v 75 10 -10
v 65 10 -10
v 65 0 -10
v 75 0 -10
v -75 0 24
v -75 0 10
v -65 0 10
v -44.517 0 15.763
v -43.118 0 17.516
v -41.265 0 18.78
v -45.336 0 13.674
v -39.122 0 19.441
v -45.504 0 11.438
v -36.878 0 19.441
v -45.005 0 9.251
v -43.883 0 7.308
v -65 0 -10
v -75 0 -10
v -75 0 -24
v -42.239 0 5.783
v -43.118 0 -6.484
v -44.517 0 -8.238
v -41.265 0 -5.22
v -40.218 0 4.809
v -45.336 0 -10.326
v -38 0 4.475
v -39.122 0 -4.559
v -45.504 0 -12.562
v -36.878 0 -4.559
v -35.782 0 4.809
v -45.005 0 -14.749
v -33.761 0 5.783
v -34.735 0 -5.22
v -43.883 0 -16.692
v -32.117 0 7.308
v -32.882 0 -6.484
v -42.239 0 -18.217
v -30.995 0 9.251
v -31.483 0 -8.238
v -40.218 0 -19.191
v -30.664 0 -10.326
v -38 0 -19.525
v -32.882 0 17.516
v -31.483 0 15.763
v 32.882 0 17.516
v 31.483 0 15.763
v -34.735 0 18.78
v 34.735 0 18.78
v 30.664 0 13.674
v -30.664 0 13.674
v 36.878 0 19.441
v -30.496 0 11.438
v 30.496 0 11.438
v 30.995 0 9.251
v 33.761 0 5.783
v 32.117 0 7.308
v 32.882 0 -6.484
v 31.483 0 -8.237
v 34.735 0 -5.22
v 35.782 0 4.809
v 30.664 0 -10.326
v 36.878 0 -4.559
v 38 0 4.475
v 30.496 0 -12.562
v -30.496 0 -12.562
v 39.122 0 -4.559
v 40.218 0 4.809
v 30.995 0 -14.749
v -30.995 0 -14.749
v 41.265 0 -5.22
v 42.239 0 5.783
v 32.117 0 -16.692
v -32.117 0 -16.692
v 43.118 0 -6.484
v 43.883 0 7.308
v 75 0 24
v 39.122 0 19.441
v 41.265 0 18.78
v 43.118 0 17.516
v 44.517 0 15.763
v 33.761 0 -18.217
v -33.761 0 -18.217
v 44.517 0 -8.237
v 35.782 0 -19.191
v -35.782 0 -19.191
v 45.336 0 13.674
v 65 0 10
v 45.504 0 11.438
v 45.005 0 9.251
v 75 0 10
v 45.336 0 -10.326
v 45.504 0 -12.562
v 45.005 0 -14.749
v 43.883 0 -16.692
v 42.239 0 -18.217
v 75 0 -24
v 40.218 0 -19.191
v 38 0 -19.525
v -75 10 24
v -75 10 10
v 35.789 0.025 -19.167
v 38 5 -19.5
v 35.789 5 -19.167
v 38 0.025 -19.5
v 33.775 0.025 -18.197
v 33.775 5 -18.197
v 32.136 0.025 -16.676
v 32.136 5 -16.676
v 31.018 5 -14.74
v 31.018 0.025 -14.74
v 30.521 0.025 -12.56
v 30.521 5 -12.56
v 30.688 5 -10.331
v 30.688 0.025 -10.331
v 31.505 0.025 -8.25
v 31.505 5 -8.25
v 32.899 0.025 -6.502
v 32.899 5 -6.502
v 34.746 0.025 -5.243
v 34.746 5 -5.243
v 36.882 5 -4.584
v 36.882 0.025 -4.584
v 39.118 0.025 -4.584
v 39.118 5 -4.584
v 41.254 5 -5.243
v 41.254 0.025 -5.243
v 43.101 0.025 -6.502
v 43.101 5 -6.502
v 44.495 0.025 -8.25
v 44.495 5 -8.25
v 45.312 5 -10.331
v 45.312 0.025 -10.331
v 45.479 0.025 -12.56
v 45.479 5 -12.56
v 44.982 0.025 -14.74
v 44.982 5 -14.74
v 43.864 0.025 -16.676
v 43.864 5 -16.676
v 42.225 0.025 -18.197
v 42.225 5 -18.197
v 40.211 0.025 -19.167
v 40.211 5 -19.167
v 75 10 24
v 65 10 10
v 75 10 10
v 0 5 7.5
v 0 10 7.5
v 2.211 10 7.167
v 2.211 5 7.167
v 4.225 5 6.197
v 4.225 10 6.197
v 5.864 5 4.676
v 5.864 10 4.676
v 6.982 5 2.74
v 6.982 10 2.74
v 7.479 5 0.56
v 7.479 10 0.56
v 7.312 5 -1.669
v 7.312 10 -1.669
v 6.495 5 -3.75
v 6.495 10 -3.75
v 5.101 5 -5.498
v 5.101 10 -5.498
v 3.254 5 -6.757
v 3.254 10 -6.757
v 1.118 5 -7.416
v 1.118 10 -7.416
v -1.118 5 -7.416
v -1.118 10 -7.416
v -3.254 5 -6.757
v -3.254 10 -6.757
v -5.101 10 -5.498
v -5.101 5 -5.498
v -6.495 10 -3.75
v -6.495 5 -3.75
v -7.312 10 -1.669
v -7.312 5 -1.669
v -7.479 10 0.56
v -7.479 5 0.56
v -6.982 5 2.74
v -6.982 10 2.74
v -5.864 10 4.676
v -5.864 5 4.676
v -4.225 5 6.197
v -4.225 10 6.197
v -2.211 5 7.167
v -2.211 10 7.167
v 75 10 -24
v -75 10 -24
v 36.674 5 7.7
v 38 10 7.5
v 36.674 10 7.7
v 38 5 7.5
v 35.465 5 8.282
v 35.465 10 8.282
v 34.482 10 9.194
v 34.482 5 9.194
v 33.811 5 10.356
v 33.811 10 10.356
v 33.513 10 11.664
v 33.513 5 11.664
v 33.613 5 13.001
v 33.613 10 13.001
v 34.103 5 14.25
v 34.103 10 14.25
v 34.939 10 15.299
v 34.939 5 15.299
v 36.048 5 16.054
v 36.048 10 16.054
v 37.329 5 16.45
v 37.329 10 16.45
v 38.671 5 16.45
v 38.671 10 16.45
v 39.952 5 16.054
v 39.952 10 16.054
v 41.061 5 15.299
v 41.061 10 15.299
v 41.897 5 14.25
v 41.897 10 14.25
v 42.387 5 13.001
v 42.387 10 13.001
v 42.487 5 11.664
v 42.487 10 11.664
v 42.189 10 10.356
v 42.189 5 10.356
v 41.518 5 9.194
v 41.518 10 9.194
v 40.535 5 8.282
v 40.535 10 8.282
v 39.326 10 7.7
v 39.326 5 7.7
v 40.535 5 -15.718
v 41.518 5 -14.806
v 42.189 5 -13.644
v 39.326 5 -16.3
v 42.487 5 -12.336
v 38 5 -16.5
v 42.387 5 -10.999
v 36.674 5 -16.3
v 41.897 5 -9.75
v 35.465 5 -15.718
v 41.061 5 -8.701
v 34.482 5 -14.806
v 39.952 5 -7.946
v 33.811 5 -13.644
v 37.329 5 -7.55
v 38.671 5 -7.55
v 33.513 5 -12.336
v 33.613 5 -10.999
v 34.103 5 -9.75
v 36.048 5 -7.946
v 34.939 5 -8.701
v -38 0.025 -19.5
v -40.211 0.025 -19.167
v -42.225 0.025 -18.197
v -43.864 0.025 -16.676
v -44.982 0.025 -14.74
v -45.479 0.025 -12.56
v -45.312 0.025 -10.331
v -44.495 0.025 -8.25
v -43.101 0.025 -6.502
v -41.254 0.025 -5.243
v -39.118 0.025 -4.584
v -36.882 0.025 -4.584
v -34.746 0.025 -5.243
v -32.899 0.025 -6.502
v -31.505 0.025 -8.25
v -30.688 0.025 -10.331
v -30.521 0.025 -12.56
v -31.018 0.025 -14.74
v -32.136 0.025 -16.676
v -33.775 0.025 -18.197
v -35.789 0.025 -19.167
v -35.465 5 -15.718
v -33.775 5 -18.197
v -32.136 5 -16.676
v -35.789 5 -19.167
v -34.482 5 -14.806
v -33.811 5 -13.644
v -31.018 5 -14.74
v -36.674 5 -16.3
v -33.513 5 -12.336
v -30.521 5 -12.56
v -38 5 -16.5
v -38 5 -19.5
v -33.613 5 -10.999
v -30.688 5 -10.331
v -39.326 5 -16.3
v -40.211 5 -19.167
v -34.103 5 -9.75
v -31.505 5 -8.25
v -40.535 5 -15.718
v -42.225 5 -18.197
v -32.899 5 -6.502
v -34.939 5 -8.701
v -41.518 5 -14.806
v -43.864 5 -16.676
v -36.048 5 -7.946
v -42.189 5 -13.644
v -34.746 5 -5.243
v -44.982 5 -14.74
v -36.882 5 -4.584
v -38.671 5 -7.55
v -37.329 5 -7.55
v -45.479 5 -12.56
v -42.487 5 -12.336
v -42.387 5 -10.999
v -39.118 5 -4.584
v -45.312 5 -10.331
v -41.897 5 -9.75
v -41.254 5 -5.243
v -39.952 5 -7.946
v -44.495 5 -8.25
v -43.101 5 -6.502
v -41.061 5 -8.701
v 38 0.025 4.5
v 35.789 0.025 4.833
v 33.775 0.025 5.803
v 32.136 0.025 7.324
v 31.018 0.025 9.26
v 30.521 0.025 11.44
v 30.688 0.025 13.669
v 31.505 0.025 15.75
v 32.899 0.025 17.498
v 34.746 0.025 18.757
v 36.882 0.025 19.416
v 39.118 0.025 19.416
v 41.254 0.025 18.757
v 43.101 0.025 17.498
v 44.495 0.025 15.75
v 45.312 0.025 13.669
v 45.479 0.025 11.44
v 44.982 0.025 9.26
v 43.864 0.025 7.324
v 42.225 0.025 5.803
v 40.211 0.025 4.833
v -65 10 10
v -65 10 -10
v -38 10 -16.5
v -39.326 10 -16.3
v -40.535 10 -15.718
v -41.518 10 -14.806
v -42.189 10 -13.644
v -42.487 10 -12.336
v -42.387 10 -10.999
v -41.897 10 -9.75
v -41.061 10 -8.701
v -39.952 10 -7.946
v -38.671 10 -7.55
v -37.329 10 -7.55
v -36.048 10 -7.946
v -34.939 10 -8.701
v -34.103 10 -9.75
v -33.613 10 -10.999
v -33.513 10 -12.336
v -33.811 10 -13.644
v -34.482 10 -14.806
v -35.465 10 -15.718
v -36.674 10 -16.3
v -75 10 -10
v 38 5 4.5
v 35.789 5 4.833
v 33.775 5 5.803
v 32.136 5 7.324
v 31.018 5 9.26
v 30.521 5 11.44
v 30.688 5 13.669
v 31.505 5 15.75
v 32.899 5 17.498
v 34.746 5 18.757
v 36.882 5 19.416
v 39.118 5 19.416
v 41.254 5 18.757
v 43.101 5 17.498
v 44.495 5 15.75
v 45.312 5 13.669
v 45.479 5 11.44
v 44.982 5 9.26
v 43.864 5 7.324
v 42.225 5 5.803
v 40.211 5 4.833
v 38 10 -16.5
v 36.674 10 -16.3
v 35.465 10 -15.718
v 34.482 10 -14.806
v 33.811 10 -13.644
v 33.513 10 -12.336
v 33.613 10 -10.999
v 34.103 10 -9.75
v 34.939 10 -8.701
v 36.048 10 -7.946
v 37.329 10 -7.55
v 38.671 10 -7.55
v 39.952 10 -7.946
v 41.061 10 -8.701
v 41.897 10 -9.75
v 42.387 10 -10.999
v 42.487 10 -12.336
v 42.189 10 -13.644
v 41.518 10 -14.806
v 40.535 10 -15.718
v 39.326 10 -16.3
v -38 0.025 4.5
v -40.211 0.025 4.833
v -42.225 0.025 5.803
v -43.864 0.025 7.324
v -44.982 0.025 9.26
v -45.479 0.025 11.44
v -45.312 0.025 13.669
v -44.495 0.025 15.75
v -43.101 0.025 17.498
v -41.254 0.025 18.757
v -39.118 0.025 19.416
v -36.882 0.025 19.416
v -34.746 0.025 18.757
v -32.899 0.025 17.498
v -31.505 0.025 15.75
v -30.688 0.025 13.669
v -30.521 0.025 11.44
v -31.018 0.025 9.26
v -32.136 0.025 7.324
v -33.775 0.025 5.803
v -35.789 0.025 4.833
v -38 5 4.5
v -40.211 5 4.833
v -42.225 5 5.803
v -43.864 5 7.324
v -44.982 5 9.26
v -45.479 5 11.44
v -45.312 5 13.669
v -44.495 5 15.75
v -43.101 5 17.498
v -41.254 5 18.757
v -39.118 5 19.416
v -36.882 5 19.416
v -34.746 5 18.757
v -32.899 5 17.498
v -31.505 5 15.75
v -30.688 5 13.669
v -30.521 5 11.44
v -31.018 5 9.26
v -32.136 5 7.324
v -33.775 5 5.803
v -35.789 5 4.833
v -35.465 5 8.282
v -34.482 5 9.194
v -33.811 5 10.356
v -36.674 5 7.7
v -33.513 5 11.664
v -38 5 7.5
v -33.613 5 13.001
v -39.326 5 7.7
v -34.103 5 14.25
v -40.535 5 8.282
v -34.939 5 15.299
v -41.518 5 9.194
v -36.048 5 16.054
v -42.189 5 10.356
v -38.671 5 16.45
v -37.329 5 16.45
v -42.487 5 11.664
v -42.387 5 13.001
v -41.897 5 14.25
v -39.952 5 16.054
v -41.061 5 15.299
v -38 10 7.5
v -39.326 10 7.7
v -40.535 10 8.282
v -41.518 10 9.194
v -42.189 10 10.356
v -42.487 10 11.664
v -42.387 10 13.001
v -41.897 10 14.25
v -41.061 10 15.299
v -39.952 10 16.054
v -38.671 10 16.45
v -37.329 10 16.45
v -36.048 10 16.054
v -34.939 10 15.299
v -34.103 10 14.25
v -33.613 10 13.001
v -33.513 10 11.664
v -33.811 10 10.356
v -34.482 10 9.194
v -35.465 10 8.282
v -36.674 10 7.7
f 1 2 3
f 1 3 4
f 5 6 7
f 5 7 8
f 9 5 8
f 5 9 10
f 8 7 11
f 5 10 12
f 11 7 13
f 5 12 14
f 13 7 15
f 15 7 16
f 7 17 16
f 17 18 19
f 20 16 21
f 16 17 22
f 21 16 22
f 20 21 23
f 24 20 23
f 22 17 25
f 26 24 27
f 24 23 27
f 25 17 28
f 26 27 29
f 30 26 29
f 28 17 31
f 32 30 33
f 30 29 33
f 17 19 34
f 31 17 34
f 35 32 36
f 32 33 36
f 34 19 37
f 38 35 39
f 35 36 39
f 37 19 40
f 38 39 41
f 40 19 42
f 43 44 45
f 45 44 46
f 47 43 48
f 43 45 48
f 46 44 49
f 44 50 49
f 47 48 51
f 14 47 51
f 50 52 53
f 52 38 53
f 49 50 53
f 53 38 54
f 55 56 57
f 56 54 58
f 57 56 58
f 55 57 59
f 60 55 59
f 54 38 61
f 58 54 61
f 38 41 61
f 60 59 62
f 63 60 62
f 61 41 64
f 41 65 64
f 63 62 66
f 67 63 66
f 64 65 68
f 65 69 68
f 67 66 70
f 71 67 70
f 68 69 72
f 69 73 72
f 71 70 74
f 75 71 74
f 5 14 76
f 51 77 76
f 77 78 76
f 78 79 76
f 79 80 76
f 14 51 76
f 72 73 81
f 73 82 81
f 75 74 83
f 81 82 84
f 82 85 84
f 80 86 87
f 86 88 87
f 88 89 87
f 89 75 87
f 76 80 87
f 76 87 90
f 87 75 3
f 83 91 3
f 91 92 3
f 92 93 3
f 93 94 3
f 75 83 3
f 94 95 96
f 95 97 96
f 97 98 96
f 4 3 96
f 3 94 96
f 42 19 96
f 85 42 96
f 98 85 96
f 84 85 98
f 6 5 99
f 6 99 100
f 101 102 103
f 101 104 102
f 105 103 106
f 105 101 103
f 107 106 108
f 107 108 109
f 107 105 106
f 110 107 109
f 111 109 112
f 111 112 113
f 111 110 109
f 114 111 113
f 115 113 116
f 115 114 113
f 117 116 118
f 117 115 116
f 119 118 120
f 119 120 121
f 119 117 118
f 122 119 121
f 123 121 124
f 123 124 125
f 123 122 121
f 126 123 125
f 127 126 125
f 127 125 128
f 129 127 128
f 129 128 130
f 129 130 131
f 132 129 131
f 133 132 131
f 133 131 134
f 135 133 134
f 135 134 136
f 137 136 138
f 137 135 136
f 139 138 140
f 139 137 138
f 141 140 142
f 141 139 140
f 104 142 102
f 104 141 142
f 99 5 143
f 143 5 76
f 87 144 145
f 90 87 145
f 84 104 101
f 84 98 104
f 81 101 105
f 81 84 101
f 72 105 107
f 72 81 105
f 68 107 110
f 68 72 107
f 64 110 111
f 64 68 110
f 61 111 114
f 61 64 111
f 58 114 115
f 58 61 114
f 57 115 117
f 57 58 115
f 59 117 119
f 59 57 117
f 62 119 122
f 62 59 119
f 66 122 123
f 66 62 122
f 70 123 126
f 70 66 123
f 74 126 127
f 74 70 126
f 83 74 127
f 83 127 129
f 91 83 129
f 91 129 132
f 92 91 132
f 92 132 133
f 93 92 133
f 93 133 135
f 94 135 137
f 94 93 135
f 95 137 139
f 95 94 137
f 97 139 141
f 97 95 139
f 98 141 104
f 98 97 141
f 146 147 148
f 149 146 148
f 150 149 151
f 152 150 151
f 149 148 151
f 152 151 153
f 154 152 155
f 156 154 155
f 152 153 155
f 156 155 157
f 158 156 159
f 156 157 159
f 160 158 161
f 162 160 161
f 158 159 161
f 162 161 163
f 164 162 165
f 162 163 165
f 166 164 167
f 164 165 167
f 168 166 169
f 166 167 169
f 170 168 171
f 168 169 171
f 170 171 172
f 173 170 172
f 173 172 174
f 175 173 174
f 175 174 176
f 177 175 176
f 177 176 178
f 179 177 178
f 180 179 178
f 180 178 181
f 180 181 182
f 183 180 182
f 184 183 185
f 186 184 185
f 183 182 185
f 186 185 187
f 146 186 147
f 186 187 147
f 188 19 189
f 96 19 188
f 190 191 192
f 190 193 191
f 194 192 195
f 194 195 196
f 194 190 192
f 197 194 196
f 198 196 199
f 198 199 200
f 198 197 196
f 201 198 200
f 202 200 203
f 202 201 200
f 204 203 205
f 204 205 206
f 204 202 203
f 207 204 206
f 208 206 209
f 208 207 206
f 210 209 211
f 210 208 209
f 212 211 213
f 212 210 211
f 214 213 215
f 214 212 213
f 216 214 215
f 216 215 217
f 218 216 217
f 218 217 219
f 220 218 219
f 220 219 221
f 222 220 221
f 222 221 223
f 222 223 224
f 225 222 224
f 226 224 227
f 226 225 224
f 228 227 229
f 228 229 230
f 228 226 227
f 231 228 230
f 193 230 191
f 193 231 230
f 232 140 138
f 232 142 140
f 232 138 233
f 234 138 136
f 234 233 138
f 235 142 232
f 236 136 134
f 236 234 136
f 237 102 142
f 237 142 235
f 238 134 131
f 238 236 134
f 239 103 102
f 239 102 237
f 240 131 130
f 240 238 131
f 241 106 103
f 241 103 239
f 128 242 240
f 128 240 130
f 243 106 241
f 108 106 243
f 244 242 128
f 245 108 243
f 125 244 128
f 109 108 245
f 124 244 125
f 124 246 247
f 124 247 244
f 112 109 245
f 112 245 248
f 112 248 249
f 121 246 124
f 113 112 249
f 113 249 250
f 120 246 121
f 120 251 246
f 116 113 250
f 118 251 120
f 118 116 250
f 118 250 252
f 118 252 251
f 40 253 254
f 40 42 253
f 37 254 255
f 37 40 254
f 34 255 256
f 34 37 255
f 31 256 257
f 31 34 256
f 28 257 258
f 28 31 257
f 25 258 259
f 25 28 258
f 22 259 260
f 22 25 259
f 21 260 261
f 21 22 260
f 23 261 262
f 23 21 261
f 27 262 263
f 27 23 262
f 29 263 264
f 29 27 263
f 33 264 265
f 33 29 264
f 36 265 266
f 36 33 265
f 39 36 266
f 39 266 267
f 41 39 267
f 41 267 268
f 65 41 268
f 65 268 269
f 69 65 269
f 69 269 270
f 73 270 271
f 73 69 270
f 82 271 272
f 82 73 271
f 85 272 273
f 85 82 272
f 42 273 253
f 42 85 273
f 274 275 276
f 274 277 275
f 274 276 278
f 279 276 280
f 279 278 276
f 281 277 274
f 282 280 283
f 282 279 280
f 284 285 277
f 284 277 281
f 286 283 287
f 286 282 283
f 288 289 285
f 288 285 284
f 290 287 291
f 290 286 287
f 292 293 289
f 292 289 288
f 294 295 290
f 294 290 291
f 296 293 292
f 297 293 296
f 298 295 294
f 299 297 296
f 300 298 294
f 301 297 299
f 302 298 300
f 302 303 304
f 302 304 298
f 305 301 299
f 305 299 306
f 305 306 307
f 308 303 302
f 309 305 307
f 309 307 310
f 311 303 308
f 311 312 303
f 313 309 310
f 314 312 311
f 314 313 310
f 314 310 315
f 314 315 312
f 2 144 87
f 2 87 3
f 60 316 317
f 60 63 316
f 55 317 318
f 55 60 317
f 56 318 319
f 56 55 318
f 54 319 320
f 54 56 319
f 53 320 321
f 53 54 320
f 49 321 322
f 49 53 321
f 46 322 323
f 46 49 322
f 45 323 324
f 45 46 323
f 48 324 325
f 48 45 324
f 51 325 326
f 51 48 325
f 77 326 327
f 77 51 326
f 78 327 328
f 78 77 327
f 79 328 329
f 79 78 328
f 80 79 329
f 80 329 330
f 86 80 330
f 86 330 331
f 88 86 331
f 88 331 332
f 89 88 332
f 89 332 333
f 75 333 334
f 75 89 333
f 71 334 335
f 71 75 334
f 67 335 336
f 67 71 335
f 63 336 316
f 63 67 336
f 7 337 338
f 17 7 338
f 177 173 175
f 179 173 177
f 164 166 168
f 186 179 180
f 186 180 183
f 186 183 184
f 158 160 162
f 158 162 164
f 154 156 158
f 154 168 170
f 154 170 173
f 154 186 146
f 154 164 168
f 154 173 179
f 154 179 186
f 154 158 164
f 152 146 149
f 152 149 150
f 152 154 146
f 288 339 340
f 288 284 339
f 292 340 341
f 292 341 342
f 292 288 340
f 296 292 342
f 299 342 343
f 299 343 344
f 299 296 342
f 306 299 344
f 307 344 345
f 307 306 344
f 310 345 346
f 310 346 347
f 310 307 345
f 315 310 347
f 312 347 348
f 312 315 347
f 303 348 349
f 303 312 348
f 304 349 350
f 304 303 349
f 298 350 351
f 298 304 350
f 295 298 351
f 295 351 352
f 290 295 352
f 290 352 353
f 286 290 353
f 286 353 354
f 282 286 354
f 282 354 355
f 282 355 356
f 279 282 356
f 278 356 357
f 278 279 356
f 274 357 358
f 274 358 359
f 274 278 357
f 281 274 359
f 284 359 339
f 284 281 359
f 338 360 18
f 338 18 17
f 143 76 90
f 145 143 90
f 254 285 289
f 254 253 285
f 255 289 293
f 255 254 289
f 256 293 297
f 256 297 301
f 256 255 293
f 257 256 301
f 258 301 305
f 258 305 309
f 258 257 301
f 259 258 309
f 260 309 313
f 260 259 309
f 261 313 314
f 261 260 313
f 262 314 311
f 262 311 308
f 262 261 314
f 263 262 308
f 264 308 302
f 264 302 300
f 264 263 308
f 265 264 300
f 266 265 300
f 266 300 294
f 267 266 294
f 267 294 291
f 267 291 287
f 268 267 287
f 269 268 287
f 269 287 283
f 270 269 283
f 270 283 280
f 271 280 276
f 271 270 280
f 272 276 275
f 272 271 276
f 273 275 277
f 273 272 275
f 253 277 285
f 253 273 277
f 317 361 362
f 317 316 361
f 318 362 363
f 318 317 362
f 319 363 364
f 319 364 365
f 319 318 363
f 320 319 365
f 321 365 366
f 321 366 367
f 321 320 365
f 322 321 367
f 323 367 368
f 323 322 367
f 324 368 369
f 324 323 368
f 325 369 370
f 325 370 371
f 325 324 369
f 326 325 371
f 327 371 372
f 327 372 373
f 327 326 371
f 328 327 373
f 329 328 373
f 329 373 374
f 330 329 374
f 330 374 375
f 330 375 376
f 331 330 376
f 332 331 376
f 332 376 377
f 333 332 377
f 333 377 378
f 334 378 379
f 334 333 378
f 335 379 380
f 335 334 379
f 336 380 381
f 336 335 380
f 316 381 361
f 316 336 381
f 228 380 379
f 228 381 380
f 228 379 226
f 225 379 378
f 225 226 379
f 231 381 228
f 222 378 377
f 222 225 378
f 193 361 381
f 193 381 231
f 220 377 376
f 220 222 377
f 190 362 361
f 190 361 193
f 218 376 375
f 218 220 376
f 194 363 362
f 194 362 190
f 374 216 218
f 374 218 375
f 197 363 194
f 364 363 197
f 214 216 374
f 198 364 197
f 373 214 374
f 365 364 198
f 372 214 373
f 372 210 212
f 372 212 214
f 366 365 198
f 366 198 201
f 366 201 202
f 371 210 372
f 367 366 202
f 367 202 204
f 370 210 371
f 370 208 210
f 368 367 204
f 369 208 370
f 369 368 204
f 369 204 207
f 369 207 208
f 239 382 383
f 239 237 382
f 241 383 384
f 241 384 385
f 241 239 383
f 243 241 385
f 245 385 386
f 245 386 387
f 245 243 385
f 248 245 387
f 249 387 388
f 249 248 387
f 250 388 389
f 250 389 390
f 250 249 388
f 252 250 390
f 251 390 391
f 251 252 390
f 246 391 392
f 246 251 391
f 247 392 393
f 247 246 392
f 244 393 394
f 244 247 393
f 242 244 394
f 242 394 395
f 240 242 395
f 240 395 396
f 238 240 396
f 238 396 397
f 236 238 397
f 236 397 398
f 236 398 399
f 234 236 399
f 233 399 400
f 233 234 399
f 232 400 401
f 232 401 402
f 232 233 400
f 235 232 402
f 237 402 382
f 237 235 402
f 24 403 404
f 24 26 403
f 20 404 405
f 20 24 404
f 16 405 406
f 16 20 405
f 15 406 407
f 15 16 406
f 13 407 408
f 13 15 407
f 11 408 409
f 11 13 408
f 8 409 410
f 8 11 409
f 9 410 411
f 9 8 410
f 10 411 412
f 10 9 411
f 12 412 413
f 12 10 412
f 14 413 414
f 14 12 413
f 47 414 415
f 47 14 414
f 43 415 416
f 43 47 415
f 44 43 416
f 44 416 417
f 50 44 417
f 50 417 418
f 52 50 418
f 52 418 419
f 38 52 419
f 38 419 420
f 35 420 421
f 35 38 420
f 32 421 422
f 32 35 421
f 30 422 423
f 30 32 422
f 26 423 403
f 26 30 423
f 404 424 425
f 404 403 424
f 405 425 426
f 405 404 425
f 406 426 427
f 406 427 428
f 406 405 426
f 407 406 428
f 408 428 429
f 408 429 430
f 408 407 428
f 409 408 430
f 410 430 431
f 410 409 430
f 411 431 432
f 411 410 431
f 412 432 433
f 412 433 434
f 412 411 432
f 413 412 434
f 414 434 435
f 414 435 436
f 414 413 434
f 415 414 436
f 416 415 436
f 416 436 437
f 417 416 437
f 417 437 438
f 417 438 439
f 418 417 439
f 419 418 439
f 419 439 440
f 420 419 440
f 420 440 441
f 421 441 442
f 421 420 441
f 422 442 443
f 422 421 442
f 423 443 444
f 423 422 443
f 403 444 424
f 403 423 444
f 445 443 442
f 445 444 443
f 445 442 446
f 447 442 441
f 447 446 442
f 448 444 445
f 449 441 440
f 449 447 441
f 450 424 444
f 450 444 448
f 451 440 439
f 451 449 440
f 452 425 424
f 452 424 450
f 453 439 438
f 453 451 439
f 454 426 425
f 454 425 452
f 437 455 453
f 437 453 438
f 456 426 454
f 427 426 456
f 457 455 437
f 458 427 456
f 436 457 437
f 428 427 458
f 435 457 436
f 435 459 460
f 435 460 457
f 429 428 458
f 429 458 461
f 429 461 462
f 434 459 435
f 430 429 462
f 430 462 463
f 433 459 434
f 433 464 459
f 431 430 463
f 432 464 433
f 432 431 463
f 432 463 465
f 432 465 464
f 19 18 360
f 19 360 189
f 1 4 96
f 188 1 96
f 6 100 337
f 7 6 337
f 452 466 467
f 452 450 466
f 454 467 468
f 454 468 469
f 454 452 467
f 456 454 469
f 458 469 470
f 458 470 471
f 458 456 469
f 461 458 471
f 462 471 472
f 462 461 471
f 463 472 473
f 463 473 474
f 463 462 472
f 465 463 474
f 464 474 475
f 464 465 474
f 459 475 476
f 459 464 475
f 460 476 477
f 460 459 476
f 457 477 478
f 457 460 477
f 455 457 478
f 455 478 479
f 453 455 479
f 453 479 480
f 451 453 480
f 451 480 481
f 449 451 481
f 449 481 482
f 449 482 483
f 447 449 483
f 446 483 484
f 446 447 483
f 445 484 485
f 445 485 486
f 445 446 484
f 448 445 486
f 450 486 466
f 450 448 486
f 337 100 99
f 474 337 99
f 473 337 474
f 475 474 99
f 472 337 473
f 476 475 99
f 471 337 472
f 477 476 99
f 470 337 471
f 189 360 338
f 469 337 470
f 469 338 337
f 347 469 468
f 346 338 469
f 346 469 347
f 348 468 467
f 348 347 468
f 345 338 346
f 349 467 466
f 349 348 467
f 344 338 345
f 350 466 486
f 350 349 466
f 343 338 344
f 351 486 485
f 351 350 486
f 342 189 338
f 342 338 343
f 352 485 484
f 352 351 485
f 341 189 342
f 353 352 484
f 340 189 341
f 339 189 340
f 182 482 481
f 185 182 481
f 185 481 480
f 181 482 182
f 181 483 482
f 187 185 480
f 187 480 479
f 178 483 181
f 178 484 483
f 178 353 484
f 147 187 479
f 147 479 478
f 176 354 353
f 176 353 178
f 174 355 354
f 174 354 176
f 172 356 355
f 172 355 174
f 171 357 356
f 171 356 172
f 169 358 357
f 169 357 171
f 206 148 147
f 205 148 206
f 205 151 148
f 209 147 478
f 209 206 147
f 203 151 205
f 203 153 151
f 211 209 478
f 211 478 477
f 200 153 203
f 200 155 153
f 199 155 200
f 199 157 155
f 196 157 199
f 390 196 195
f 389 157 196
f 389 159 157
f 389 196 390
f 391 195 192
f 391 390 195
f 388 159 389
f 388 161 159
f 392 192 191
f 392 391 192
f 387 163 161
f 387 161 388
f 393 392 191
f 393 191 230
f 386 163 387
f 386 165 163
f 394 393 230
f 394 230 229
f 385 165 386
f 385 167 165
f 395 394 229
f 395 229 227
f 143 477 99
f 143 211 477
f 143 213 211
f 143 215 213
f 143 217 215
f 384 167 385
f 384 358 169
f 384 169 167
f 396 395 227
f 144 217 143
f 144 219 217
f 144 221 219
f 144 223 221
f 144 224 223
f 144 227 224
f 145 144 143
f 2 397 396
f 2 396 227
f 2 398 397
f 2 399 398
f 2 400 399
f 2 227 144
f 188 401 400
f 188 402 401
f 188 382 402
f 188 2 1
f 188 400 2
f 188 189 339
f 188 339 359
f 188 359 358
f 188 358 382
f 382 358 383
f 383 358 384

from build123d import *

# Parameters (mm, degrees)
SKETCH1_W                                  = 150
SKETCH1_H                                  = 48
BOSS_EXTRUDE1_DEPTH                        = 10
CBORE_FOR_M8_CHEESE_HEAD_SCREW1_AT_2_COUNT = 2
CBORE_FOR_M8_CHEESE_HEAD_SCREW1_AT_2_PITCH = 76
CBORE_FOR_M8_CHEESE_HEAD_SCREW1_AT_3_COUNT = 2
CBORE_FOR_M8_CHEESE_HEAD_SCREW1_AT_3_PITCH = 24
CBORE_FOR_M8_CHEESE_HEAD_SCREW1_AT_4_COUNT = 2
CBORE_FOR_M8_CHEESE_HEAD_SCREW1_AT_4_PITCH = 79.699435381
SKETCH6_R                                  = 7.5
CUT_EXTRUDE2_DEPTH                         = 5
SKETCH7_W                                  = 20
SKETCH7_H                                  = 20
CUT_EXTRUDE3_DEPTH                         = 80.37883849


with BuildPart() as part:
    # Sketch1 → Boss-Extrude1 (new body)
    with BuildSketch(Plane(origin=(0, 0, 0), x_dir=(1, 0, 0), z_dir=(0, 1, 0))):
        Rectangle(SKETCH1_W, SKETCH1_H)
    extrude(amount=BOSS_EXTRUDE1_DEPTH)

    # Sketch4 → CBORE for M8 Cheese Head Screw1 (revolve, cut)
    with BuildSketch(Plane(origin=(38, 0, 12), x_dir=(0, 0, -1), z_dir=(1, 0, 0))):
        Polygon((0, 0), (0, 12.703872786), (4.5, 10), (4.5, 5), (7.5, 5), (7.5, 0.025), (7.525, 0), align=None)
    cbore_for_m8_cheese_head_screw1 = revolve(axis=Axis((38, -6.35, 12), (0, 1, 0)), mode=Mode.SUBTRACT)

    # CBORE for M8 Cheese Head Screw1 at 2: CBORE for M8 Cheese Head Screw1 ×2
    with Locations(*[(-i * CBORE_FOR_M8_CHEESE_HEAD_SCREW1_AT_2_PITCH, 0, 0) for i in range(1, CBORE_FOR_M8_CHEESE_HEAD_SCREW1_AT_2_COUNT)]):
        add(cbore_for_m8_cheese_head_screw1, mode=Mode.SUBTRACT)

    # CBORE for M8 Cheese Head Screw1 at 3: CBORE for M8 Cheese Head Screw1 ×2
    with Locations(*[(0, 0, -i * CBORE_FOR_M8_CHEESE_HEAD_SCREW1_AT_3_PITCH) for i in range(1, CBORE_FOR_M8_CHEESE_HEAD_SCREW1_AT_3_COUNT)]):
        add(cbore_for_m8_cheese_head_screw1, mode=Mode.SUBTRACT)

    # CBORE for M8 Cheese Head Screw1 at 4: CBORE for M8 Cheese Head Screw1 ×2
    with Locations(*[Vector(-0.9535826651341417, 0, -0.3011313679370974) * (i * CBORE_FOR_M8_CHEESE_HEAD_SCREW1_AT_4_PITCH) for i in range(1, CBORE_FOR_M8_CHEESE_HEAD_SCREW1_AT_4_COUNT)]):
        add(cbore_for_m8_cheese_head_screw1, mode=Mode.SUBTRACT)

    # Sketch6 → Cut-Extrude2 (cut)
    with BuildSketch(Plane(origin=(0, 10, 0), x_dir=(1, 0, 0), z_dir=(0, 1, 0))):
        with Locations(Location((0, 0, 0), (0, 0, 270))):
            Circle(SKETCH6_R)
    extrude(amount=-CUT_EXTRUDE2_DEPTH, mode=Mode.SUBTRACT)

    # Sketch7 → Cut-Extrude3 (cut, through all)
    with BuildSketch(Plane(origin=(0, 10, 0), x_dir=(1, 0, 0), z_dir=(0, 1, 0))):
        with Locations((75, 0)):
            Rectangle(SKETCH7_W, SKETCH7_H)
        with Locations((-75, 0)):
            Rectangle(SKETCH7_W, SKETCH7_H)
    extrude(amount=-CUT_EXTRUDE3_DEPTH, mode=Mode.SUBTRACT)


solid = part.part
